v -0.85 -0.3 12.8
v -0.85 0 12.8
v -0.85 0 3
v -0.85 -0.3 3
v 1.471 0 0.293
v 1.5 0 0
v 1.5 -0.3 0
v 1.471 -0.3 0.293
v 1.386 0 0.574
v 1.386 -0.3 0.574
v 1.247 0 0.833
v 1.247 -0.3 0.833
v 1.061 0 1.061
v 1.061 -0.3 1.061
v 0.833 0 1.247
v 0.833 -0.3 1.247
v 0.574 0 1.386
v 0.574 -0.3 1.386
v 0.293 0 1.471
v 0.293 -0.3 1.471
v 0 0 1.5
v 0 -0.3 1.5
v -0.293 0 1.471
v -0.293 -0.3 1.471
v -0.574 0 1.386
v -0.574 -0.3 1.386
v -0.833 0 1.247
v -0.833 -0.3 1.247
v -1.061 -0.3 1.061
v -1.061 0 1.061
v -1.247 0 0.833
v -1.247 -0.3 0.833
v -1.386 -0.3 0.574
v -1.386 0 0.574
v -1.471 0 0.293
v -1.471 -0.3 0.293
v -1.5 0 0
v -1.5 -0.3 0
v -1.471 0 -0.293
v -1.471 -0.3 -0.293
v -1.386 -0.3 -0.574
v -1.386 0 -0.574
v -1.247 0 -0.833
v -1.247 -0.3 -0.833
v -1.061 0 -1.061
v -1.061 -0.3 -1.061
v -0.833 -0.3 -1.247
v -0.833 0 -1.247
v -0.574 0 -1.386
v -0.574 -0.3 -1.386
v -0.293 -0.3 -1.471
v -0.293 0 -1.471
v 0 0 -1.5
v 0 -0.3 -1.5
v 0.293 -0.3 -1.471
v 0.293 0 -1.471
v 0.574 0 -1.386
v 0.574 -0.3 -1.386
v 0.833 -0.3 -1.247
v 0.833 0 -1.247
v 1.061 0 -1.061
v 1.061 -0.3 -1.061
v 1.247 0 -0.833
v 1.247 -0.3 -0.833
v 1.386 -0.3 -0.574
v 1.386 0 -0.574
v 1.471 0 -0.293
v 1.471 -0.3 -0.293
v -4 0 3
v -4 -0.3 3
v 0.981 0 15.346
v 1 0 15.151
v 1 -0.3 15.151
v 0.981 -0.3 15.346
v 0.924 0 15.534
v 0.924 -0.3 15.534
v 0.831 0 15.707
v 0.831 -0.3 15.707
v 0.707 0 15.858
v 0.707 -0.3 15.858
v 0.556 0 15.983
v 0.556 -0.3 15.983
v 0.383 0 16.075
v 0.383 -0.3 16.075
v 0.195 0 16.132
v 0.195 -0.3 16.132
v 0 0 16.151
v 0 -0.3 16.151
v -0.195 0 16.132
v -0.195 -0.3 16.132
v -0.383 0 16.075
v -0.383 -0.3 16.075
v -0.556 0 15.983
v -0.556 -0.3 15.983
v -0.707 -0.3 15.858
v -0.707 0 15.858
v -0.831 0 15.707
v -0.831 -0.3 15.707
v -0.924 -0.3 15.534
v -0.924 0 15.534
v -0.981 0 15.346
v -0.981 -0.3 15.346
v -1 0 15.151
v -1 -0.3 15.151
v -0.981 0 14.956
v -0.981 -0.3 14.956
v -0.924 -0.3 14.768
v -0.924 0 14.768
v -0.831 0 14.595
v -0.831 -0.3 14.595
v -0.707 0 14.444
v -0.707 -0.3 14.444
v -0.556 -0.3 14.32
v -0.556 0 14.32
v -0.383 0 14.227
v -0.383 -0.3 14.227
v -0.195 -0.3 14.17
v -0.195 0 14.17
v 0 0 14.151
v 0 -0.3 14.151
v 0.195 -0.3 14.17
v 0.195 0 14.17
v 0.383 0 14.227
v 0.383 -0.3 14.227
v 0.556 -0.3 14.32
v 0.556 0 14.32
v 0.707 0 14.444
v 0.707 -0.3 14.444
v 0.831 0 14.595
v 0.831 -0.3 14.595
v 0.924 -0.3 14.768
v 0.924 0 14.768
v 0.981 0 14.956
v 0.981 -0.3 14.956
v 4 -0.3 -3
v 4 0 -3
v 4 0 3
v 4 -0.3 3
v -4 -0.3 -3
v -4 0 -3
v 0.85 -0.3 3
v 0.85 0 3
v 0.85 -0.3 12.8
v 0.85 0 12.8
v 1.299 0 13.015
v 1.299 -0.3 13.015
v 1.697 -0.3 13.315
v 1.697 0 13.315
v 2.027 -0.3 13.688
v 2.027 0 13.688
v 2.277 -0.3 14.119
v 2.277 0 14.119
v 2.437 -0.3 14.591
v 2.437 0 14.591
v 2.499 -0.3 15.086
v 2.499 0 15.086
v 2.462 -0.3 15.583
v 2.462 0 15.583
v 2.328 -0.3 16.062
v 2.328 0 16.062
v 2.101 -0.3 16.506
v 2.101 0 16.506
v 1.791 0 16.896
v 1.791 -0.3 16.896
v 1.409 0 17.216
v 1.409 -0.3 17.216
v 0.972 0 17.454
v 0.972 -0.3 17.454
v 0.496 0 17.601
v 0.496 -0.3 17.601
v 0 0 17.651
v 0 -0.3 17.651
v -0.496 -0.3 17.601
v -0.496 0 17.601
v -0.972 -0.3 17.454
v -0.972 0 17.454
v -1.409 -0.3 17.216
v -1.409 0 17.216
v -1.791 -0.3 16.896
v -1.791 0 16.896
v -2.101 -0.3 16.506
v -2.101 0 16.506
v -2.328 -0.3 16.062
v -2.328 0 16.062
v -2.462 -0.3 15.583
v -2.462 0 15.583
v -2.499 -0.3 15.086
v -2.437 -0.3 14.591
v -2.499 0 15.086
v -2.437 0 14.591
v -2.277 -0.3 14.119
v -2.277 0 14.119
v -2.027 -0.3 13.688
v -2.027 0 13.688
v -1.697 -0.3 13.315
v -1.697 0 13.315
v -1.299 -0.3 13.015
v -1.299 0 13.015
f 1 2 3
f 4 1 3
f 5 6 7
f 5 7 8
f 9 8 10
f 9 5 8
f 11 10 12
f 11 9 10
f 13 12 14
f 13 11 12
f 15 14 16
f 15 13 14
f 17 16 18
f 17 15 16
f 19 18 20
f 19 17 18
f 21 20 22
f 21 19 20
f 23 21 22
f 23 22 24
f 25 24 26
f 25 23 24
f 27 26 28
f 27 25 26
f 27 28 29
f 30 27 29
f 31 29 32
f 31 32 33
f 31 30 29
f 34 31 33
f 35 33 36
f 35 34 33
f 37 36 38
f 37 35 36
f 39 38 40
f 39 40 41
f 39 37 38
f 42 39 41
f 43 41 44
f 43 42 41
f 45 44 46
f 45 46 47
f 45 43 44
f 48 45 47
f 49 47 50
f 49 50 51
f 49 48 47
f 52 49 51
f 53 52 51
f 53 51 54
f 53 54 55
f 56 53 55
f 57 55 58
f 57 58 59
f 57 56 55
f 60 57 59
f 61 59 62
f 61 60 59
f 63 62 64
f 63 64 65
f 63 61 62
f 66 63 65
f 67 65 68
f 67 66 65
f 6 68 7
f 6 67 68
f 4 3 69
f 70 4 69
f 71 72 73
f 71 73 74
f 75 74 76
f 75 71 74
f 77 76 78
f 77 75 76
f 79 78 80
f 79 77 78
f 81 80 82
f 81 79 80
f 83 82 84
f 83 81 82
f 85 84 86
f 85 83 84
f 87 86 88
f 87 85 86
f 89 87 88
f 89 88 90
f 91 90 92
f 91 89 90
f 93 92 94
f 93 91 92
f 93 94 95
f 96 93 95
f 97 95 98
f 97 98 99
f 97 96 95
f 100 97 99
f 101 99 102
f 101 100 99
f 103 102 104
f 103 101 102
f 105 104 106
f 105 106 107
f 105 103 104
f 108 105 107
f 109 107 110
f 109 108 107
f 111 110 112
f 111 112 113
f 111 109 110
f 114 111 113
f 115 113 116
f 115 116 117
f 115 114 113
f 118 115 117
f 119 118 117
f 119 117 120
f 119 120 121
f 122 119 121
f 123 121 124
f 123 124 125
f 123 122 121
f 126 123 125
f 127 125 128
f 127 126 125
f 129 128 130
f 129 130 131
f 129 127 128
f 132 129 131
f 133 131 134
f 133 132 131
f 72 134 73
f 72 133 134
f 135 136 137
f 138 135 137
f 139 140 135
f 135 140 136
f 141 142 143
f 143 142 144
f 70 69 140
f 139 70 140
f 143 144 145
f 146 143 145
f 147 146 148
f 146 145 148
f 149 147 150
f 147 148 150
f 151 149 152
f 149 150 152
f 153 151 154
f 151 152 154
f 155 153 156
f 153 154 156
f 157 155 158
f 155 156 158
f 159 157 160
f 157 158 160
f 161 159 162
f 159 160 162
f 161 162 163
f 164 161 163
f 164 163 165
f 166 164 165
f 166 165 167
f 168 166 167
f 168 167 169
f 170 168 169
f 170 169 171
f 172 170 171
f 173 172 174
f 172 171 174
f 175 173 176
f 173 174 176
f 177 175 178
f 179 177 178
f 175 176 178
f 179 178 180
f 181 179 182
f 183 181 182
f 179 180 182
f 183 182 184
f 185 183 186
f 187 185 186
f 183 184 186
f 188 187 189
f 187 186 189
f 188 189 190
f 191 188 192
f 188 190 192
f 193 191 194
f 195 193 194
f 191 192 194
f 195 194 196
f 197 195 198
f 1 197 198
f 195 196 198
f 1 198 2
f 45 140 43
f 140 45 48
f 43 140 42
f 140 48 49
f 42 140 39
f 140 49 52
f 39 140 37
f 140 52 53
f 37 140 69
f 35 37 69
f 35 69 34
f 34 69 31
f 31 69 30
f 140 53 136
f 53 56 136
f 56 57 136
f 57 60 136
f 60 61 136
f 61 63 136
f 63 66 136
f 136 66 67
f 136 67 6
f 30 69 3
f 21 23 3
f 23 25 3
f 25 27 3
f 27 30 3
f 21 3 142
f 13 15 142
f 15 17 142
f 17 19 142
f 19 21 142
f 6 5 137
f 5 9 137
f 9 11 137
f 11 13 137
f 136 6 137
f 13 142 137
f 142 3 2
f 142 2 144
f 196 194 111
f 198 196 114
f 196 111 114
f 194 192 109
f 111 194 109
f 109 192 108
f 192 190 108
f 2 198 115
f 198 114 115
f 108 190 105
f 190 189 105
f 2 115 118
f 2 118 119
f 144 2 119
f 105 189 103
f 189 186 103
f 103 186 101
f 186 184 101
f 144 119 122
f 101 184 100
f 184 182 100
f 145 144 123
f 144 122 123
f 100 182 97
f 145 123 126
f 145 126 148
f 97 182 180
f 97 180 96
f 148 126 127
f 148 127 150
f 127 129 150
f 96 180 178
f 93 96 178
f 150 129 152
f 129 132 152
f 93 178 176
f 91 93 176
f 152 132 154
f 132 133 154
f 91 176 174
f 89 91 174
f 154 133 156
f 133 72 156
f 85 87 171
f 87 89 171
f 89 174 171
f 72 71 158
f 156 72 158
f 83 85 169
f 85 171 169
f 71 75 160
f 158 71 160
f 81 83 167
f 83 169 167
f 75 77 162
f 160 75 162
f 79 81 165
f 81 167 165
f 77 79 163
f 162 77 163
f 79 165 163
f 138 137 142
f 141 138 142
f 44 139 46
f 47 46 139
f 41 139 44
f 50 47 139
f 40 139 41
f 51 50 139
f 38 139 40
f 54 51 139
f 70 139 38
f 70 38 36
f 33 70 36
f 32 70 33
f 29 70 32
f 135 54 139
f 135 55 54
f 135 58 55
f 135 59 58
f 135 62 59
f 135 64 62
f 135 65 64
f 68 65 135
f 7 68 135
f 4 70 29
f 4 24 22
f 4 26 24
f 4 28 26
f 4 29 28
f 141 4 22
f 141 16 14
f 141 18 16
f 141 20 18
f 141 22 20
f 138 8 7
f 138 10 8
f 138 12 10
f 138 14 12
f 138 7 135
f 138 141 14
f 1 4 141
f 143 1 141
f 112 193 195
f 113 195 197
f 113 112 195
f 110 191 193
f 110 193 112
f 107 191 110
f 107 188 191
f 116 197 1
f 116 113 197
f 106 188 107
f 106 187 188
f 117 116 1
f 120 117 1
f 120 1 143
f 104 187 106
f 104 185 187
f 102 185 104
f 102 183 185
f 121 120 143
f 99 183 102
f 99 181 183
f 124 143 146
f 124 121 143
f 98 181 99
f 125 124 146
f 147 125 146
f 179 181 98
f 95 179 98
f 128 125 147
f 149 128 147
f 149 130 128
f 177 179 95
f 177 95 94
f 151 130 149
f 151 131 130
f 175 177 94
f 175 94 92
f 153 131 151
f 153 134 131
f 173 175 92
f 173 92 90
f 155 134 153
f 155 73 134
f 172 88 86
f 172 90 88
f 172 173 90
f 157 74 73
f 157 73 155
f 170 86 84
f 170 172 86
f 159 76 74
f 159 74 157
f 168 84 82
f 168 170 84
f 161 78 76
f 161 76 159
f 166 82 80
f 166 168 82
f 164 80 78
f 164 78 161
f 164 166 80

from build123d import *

# Parameters (mm, degrees)
F0_R     = 1.5
F0_R_2   = 1
F1_DEPTH = 0.3


with BuildPart() as f1:
    # F0 (on Front) → F1 (new body)
    with BuildSketch(Plane.XZ):
        with BuildLine():
            Line((-4, -3), (4, -3))
            Line((4, -3), (4, 3))
            Line((4, 3), (0.85, 3))
            Line((0.85, 3), (0.85, 12.8))
            ThreePointArc((0.85, 12.8), (0, 17.651064), (-0.85, 12.8))
            Line((-0.85, 12.8), (-0.85, 3))
            Line((-0.85, 3), (-4, 3))
            Line((-4, 3), (-4, -3))
        make_face()
        Circle(F0_R, mode=Mode.SUBTRACT)
        with Locations((0, 15.151064)):
            Circle(F0_R_2, mode=Mode.SUBTRACT)
    extrude(amount=F1_DEPTH)


solid = f1.part
